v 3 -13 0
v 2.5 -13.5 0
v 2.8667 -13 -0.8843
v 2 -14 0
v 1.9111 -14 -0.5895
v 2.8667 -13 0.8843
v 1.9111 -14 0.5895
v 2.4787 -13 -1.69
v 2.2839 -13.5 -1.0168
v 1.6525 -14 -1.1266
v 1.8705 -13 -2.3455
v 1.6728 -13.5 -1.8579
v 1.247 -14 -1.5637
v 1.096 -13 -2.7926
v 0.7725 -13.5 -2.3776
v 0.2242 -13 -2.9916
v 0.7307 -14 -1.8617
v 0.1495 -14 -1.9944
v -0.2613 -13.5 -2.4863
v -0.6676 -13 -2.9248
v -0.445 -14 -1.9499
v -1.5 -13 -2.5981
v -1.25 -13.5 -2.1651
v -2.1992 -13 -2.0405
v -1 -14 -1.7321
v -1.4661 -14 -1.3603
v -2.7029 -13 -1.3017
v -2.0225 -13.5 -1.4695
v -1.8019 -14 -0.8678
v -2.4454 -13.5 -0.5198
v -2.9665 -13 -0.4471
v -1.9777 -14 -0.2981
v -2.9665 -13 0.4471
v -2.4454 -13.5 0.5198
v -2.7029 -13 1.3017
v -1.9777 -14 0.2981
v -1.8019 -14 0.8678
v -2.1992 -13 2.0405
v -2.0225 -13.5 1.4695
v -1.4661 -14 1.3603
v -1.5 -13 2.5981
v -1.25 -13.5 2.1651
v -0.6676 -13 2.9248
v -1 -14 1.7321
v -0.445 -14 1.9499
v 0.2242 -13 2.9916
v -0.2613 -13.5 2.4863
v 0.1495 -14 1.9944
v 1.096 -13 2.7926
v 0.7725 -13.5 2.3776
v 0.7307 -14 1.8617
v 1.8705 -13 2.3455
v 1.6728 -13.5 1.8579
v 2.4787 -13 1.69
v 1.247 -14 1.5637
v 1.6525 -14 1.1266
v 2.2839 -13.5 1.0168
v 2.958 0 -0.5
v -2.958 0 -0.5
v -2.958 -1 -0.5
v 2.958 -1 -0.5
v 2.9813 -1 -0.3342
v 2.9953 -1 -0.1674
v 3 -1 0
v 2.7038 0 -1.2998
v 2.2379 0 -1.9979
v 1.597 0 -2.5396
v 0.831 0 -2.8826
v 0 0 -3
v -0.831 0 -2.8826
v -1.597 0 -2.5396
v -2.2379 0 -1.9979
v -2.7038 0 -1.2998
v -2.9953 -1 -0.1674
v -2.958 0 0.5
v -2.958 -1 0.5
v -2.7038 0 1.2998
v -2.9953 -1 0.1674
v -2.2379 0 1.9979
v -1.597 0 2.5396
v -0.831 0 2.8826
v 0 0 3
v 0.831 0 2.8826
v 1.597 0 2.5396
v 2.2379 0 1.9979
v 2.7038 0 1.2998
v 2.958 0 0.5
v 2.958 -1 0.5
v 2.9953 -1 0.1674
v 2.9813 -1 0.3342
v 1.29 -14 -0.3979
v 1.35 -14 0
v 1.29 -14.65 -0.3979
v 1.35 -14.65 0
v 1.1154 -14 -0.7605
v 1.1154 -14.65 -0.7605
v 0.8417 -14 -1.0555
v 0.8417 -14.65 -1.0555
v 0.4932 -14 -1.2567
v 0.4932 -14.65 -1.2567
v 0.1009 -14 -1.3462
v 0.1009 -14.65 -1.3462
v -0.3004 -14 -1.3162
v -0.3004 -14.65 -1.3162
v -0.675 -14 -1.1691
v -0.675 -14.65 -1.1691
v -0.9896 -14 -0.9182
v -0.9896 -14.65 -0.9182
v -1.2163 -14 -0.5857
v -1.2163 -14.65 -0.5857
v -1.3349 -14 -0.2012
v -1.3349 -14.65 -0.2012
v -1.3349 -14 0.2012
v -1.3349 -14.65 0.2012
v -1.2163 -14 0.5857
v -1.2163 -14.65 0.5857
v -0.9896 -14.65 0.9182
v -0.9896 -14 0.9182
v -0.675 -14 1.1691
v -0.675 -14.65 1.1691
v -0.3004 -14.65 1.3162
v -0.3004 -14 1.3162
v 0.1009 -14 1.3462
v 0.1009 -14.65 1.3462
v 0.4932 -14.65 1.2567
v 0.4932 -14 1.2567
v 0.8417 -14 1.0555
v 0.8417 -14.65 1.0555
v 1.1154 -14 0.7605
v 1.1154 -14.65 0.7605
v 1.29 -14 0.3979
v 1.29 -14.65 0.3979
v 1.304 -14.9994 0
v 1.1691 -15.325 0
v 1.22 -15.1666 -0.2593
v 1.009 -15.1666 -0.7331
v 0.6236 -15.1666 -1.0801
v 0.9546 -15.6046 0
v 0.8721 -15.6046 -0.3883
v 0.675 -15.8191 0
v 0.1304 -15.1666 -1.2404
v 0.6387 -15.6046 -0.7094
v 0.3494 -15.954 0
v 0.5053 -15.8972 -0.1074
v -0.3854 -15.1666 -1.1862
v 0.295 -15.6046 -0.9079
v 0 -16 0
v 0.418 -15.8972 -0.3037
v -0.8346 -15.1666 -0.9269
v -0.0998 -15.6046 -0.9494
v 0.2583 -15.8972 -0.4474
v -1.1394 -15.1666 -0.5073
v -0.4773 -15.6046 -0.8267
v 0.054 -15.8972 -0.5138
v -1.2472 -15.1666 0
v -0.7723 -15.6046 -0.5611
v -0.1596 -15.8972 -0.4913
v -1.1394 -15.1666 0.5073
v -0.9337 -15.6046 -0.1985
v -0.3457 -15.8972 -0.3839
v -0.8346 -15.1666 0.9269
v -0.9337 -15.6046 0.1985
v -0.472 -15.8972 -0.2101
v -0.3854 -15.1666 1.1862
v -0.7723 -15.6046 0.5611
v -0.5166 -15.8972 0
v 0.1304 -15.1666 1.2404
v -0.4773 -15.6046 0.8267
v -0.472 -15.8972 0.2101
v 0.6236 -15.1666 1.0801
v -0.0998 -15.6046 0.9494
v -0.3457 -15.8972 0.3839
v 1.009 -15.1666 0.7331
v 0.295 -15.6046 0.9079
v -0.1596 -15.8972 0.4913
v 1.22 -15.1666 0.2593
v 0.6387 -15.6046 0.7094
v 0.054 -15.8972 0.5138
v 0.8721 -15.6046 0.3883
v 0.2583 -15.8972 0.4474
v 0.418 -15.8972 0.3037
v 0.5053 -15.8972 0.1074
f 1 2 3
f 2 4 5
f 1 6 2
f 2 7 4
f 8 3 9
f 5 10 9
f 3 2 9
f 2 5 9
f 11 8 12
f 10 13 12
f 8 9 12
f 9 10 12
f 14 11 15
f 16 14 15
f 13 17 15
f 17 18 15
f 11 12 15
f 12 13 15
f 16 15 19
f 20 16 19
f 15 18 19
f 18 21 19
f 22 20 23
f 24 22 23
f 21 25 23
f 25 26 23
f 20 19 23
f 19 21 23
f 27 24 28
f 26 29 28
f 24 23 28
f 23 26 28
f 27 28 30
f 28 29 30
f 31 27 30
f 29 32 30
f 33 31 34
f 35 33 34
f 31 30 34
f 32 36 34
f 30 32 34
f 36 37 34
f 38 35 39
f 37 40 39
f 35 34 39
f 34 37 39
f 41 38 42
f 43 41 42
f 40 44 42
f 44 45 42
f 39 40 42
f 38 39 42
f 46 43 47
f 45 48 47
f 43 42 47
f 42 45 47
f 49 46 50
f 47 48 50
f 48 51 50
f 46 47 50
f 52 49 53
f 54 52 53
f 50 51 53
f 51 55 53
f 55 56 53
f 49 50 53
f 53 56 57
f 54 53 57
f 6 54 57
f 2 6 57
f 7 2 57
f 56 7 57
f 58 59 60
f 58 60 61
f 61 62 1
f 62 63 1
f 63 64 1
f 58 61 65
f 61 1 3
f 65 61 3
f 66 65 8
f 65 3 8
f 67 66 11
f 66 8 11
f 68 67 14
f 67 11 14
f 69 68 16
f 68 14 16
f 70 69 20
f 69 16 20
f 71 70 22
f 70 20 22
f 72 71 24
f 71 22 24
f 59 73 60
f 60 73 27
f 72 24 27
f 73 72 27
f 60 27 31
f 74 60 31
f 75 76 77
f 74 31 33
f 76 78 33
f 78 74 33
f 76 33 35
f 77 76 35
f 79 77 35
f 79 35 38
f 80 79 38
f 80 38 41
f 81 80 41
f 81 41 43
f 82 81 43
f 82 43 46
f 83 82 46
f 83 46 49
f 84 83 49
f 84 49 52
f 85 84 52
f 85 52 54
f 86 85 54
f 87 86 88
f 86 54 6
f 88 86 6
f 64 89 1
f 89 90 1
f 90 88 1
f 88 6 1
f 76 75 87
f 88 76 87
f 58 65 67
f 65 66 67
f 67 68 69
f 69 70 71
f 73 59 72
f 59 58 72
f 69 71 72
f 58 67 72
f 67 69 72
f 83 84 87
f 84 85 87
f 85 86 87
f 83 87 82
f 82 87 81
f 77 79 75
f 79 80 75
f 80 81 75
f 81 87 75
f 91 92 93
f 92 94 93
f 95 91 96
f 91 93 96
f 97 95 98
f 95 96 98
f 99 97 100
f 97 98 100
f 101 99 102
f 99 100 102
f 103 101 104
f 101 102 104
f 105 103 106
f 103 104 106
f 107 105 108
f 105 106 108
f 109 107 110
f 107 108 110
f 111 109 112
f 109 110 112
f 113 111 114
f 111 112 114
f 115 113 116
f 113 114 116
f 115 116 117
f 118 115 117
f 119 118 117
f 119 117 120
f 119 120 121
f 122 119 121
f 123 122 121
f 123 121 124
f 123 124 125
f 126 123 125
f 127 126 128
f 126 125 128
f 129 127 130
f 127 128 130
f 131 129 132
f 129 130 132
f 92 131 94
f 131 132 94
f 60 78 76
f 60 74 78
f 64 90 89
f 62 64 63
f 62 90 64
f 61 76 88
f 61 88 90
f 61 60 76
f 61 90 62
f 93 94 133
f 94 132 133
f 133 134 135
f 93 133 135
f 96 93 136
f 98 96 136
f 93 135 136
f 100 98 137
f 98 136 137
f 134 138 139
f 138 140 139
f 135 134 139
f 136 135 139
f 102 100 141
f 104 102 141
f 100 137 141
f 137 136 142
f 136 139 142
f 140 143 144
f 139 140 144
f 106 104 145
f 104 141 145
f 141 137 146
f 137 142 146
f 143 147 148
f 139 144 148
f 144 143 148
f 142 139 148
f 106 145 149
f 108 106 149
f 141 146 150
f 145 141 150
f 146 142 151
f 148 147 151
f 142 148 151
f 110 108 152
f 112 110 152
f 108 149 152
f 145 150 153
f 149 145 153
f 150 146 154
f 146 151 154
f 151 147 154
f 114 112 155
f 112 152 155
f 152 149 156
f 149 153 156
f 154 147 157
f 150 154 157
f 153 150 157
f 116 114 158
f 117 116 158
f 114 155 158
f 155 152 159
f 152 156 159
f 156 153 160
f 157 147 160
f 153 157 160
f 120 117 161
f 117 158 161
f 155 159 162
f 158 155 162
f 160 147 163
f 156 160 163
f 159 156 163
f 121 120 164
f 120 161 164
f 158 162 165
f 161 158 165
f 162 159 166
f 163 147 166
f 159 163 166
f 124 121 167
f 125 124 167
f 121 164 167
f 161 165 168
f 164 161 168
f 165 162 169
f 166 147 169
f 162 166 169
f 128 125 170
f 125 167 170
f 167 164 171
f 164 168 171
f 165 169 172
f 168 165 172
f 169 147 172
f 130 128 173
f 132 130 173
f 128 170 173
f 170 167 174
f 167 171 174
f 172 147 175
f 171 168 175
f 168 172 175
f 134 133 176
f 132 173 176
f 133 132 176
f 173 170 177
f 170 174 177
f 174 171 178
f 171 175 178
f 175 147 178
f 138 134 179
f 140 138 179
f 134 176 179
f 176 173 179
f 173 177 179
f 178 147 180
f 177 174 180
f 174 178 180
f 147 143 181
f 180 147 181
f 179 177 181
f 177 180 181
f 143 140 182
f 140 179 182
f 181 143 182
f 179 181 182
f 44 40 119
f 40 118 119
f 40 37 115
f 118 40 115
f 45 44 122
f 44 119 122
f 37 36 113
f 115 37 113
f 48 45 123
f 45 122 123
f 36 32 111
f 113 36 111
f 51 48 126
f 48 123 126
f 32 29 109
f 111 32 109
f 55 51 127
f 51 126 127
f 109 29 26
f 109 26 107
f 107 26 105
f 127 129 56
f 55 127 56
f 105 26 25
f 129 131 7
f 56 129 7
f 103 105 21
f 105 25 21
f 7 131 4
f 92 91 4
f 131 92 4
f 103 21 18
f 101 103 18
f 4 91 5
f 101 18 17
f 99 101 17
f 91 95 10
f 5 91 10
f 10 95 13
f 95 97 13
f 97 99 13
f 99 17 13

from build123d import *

# Parameters (mm, degrees)
CHAMFER1_SIZE      = 1
SKETCH2_W          = 6.946191838
SKETCH2_H          = 1
CUT_EXTRUDE1_DEPTH = 1


with BuildPart() as part:
    # Sketch1 → Revolve1 (revolve)
    with BuildSketch(Plane.XY):
        with BuildLine():
            Line((0, 0), (-3, 0))
            Line((-3, 0), (-3, -14))
            Line((-3, -14), (-1.35, -14))
            Line((-1.35, -14), (-1.35, -14.65))
            ThreePointArc((-1.35, -14.65), (-0.954594155, -15.604594155), (0, -16))
            Line((0, -16), (0, 0))
        make_face()
    revolve(axis=Axis((0, -16, 0), (0, 1, 0)))

    # Chamfer1
    chamfer1_edges = [part.edges().sort_by_distance(p)[0] for p in [
        (3, -14, 0),
    ]]
    chamfer(chamfer1_edges, length=CHAMFER1_SIZE)

    # Sketch2 → Cut-Extrude1 (cut)
    with BuildSketch(Plane(origin=(0, 0, 0), x_dir=(1, 0, 0), z_dir=(0, 1, 0))):
        Rectangle(SKETCH2_W, SKETCH2_H)
    extrude(amount=-CUT_EXTRUDE1_DEPTH, mode=Mode.SUBTRACT)


solid = part.part
